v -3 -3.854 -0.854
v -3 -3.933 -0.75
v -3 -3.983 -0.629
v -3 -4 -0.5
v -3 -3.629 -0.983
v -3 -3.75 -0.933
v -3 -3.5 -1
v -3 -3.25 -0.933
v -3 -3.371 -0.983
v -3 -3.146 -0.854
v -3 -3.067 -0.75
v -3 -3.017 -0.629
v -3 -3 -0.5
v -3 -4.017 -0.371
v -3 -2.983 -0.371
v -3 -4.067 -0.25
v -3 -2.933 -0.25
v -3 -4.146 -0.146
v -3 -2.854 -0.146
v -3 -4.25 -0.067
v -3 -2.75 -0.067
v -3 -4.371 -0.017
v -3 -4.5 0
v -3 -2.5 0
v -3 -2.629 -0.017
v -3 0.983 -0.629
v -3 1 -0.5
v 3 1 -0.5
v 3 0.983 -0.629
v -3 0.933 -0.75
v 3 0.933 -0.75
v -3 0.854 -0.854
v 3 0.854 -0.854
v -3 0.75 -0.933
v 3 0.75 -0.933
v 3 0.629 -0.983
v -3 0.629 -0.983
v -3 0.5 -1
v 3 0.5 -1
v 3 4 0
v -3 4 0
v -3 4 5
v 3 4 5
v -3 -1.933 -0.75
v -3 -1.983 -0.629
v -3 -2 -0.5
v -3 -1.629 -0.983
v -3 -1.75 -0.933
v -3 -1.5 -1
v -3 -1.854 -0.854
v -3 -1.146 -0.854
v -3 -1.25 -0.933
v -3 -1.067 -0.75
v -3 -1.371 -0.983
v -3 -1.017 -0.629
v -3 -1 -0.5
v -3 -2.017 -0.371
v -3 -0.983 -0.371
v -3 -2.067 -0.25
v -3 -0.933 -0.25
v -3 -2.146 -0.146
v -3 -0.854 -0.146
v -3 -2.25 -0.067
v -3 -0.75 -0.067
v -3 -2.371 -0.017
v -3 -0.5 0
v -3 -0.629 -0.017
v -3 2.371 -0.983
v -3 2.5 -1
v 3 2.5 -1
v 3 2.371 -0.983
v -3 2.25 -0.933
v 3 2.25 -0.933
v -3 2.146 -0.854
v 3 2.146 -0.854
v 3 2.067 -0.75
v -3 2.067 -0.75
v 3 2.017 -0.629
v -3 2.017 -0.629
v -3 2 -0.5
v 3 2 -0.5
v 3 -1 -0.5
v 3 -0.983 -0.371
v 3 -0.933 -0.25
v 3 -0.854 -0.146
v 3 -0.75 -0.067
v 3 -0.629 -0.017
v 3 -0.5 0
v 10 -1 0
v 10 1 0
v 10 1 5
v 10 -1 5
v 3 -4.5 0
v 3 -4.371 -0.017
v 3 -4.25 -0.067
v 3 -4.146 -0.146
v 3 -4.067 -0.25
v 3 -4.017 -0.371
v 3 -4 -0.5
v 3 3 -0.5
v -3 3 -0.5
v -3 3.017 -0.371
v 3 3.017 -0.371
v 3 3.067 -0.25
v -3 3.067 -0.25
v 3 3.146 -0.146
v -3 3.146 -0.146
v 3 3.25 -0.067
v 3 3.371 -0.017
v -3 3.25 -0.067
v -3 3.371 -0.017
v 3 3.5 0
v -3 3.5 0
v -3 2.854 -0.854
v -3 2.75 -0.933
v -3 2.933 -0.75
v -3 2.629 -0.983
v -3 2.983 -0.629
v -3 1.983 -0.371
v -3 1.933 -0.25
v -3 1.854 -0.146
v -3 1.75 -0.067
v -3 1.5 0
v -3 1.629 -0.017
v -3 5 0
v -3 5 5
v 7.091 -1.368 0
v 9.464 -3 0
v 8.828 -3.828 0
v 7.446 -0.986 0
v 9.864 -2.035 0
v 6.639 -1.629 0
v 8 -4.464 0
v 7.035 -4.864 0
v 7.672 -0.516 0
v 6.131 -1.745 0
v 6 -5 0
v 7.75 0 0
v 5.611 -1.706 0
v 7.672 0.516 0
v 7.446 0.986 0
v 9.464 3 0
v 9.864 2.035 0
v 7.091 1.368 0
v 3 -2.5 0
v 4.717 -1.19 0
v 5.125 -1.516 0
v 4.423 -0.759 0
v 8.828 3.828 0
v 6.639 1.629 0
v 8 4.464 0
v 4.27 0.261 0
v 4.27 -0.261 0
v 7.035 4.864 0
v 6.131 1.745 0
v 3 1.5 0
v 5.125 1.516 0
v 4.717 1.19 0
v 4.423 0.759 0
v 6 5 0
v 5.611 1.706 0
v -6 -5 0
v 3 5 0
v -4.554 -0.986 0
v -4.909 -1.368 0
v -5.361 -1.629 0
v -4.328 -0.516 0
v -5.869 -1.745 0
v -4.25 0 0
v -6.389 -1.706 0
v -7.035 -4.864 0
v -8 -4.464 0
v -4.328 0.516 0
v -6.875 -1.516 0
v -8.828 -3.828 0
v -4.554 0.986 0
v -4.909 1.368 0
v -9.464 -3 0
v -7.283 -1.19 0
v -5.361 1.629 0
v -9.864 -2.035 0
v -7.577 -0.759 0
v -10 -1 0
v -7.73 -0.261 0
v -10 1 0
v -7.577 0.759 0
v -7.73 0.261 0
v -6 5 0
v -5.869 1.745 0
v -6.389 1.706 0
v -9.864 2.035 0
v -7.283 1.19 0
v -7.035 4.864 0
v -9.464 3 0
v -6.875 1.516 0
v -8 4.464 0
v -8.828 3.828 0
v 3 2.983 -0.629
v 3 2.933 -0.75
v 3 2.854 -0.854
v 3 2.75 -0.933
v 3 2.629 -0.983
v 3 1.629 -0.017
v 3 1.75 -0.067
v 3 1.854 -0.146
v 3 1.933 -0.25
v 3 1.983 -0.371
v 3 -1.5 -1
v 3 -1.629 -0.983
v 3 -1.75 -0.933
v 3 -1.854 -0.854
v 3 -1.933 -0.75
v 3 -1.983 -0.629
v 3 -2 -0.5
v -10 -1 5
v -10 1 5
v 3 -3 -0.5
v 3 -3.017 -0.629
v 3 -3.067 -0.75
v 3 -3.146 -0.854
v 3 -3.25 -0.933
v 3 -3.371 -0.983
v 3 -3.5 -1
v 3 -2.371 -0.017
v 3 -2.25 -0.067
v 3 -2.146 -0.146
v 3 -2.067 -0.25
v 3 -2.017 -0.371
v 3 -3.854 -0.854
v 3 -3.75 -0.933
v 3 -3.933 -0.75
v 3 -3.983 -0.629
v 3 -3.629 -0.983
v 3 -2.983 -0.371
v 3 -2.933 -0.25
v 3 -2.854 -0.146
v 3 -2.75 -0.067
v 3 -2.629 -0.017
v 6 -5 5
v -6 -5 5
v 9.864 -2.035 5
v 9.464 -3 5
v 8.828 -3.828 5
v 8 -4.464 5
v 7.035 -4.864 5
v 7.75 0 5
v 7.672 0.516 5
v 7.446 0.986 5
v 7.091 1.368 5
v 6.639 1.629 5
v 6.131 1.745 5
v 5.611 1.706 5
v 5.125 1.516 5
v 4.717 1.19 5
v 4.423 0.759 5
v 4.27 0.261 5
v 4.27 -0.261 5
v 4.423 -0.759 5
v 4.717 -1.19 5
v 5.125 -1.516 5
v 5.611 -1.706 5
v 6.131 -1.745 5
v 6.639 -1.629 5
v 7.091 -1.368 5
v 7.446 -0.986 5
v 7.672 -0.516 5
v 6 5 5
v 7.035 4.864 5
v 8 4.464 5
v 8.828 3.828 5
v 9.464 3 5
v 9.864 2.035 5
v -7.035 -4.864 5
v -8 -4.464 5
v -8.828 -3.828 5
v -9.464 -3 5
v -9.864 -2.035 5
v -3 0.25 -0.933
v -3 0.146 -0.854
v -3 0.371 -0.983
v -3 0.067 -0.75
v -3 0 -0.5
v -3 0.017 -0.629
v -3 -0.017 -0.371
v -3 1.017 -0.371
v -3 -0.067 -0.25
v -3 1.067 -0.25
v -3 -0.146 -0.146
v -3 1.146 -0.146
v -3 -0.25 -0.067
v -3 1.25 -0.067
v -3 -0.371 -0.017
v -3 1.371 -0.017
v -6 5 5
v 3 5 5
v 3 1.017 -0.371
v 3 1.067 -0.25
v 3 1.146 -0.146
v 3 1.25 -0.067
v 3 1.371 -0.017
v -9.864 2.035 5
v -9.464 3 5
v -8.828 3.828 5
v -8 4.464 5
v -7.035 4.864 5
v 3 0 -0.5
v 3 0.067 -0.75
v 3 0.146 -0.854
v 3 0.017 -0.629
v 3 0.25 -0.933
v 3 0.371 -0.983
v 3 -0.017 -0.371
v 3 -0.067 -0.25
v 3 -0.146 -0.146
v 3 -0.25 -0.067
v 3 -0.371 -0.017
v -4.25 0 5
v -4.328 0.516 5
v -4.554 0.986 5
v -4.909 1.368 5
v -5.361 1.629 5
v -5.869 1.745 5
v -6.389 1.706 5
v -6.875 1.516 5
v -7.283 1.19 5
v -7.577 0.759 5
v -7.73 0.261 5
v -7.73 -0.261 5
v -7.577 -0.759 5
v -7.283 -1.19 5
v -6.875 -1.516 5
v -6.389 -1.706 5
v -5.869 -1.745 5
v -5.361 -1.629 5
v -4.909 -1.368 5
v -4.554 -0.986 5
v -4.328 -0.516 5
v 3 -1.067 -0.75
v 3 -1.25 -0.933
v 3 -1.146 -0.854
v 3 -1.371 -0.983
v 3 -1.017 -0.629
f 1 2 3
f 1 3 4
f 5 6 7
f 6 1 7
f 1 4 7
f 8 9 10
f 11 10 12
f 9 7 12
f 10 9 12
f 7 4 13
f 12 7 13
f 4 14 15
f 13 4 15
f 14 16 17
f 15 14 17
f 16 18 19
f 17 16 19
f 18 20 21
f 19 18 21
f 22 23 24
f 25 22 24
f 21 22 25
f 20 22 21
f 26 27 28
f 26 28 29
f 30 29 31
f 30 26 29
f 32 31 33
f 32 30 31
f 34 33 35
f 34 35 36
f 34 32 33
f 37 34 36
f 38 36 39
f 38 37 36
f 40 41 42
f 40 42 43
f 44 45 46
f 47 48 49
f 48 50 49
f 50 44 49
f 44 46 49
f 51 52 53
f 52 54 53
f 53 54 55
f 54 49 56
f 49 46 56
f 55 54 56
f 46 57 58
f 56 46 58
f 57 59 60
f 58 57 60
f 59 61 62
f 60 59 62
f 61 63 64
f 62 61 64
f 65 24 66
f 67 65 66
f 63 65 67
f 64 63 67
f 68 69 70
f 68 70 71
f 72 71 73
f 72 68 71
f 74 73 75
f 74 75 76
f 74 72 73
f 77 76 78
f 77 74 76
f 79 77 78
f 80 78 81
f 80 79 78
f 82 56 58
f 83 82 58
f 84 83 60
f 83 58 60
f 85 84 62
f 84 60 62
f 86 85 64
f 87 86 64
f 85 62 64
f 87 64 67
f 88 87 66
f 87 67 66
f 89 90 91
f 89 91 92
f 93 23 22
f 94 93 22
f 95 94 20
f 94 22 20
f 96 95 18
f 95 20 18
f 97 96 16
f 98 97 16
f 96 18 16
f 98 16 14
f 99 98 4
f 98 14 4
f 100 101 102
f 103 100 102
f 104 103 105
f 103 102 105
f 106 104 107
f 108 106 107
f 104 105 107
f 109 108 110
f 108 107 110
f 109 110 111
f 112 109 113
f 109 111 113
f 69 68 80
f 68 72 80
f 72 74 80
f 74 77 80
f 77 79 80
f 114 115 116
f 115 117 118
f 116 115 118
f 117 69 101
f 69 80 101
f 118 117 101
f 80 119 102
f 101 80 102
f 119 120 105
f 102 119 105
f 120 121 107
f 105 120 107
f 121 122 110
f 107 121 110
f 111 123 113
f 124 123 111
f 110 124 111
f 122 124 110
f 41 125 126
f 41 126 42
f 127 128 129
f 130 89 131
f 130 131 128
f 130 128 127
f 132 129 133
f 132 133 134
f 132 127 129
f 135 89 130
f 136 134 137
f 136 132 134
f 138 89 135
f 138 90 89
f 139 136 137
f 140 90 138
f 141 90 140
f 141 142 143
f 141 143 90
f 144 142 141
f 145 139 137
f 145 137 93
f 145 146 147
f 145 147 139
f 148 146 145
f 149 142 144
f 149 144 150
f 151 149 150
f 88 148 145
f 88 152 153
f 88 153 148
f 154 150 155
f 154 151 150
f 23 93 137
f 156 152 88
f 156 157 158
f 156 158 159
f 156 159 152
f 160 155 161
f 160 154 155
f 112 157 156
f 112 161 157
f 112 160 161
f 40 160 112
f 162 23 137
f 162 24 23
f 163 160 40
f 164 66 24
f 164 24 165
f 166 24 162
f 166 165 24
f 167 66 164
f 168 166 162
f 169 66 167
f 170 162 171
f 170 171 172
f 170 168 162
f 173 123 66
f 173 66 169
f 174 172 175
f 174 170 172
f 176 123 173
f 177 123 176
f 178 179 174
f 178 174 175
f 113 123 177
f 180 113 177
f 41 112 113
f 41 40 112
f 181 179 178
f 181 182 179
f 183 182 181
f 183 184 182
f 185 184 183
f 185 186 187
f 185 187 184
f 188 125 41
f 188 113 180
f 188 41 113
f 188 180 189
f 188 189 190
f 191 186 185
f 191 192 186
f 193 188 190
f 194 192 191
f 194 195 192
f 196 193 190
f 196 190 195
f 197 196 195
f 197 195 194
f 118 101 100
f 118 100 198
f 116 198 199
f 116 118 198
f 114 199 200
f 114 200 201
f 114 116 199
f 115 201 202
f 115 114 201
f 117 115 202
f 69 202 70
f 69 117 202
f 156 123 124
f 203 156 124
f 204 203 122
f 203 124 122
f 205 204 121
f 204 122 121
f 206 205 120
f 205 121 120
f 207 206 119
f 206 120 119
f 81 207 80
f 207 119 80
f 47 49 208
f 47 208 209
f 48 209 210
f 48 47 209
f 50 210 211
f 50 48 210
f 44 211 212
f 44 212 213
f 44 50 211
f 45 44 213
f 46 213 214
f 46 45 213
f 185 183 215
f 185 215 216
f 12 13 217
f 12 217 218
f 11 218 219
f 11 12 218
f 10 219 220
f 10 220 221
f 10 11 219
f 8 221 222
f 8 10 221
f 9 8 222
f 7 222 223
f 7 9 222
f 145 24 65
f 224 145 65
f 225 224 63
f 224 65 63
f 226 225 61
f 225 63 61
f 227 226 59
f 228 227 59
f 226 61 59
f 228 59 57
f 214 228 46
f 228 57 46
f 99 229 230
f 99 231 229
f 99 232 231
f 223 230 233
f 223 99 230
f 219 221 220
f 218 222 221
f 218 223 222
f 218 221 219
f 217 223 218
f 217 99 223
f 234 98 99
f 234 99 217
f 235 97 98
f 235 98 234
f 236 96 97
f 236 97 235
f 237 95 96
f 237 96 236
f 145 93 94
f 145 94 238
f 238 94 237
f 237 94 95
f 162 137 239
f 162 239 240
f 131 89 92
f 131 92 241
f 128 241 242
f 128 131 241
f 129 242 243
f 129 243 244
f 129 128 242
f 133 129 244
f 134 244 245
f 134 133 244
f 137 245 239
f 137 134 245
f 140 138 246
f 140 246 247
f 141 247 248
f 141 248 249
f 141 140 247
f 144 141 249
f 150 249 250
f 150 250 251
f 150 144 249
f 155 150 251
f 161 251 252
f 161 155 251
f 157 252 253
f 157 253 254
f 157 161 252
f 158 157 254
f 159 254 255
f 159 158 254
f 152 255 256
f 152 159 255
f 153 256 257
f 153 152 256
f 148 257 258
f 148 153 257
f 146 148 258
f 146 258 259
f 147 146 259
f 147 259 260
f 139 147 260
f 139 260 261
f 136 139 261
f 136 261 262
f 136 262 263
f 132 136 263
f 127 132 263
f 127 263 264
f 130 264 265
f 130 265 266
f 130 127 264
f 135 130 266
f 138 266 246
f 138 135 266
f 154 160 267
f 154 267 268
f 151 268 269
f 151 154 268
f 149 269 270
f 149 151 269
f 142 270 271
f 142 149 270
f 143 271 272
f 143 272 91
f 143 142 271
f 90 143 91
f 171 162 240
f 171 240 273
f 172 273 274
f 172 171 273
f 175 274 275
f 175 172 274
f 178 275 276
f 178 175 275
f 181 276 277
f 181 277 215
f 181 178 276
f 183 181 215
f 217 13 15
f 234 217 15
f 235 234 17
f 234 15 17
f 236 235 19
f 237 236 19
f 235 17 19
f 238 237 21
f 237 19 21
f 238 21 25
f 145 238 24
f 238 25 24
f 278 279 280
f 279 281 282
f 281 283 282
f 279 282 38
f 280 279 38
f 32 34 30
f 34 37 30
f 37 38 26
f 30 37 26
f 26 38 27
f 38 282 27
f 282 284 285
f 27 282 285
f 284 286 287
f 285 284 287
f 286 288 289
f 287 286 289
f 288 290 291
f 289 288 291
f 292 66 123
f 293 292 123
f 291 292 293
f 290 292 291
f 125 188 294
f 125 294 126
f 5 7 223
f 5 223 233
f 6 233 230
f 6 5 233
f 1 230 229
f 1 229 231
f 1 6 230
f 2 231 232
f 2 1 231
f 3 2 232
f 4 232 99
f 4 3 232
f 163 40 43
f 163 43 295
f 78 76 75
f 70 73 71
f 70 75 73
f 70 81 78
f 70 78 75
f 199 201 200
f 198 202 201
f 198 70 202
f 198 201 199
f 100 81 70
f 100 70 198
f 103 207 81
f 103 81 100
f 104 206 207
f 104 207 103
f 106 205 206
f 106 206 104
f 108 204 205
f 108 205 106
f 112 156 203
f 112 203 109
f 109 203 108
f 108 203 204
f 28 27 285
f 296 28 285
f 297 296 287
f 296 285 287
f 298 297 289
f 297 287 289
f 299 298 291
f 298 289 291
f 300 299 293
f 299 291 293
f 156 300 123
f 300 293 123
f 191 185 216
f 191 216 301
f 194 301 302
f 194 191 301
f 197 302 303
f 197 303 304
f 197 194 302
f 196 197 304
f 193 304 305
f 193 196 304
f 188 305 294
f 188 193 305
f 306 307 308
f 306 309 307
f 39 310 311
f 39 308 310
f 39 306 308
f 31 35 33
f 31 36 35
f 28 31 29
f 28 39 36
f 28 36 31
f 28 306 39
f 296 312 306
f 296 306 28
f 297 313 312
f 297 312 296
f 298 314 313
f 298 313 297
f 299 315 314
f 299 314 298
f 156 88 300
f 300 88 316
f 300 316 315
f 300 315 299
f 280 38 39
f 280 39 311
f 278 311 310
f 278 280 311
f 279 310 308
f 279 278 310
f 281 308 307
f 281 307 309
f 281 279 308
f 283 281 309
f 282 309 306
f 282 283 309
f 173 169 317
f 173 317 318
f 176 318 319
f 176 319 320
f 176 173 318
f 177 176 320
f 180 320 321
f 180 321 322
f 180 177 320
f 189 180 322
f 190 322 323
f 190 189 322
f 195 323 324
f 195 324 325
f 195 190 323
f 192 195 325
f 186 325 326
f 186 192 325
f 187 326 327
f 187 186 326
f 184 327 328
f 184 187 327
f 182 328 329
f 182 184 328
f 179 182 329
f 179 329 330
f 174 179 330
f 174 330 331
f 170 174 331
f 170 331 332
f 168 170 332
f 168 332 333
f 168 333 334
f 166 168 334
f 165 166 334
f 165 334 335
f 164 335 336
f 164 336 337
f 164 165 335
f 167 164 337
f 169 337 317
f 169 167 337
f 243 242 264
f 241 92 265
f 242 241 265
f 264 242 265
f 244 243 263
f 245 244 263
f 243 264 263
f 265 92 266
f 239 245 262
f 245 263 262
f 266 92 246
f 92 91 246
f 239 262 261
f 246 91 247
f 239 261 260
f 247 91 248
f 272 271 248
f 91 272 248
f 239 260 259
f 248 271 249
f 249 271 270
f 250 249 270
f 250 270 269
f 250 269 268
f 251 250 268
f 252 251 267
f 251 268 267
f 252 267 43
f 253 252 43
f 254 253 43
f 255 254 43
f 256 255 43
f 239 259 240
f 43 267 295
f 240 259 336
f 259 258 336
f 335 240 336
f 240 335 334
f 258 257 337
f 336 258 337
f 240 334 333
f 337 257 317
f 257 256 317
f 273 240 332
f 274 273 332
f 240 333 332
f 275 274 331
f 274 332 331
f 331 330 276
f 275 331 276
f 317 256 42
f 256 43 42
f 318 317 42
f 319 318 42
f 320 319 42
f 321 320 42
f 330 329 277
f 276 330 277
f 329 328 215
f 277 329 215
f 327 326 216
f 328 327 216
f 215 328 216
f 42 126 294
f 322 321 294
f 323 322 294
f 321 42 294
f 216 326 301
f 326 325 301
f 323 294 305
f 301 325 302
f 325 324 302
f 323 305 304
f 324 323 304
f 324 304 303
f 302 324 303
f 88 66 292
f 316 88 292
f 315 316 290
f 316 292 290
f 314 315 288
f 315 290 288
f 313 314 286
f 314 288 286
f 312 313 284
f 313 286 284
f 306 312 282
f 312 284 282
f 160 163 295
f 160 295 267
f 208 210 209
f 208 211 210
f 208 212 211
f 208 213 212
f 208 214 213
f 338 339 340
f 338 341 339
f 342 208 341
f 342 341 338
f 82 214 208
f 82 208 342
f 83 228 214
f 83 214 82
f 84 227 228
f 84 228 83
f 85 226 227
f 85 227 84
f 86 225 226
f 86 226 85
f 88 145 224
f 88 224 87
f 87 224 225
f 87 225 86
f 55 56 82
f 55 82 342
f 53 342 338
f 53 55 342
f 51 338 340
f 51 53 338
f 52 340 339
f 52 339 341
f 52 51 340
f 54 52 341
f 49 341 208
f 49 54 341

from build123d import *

# Parameters (mm, degrees)
SKETCH1_R           = 1.75
BOSS_EXTRUDE1_DEPTH = 5
SKETCH2_W           = 6
SKETCH2_H           = 1
BOSS_EXTRUDE2_DEPTH = 1
FILLET1_START       = -3
FILLET1_DEPTH       = 6
FILLET1_2_DEPTH     = 6


with BuildPart() as part:
    # Sketch1 → Boss-Extrude1 (new body)
    with BuildSketch(Plane.XY):
        with BuildLine():
            Line((-6, 5), (-3, 5))
            Line((-3, 5), (-3, 4))
            Line((-3, 4), (3, 4))
            Line((3, 4), (3, 5))
            Line((3, 5), (6, 5))
            ThreePointArc((6, 5), (8.828427125, 3.828427125), (10, 1))
            Line((10, 1), (10, -1))
            ThreePointArc((10, -1), (8.828427125, -3.828427125), (6, -5))
            Line((6, -5), (-6, -5))
            ThreePointArc((-6, -5), (-8.828427125, -3.828427125), (-10, -1))
            Line((-10, -1), (-10, 1))
            ThreePointArc((-10, 1), (-8.828427125, 3.828427125), (-6, 5))
        make_face()
        with Locations((6, 0)):
            Circle(SKETCH1_R, mode=Mode.SUBTRACT)
        with Locations((-6, 0)):
            Circle(SKETCH1_R, mode=Mode.SUBTRACT)
    extrude(amount=BOSS_EXTRUDE1_DEPTH)

    # Sketch2 → Boss-Extrude2 (add)
    with BuildSketch(Plane(origin=(0, 0, 0), x_dir=(-1, 0, 0), z_dir=(0, 0, -1))):
        with Locations((0, 2.5)):
            Rectangle(SKETCH2_W, SKETCH2_H)
        with Locations((0, 0.5)):
            Rectangle(SKETCH2_W, SKETCH2_H)
        with Locations((0, -1.5)):
            Rectangle(SKETCH2_W, SKETCH2_H)
        with Locations((0, -3.5)):
            Rectangle(SKETCH2_W, SKETCH2_H)
    extrude(amount=BOSS_EXTRUDE2_DEPTH)

    # Fillet1: read off the stored shape, not the designer's step
    # Fillet1 outline → Fillet1 (cut)
    with BuildSketch(Plane.YZ.offset(FILLET1_START)):
        with BuildLine():
            ThreePointArc((-3.5, -1), (-3.853553391, -0.853553391), (-4, -0.5))
            Line((-4, -0.5), (-4, -1))
            Line((-4, -1), (-3.5, -1))
        make_face()
        with BuildLine():
            ThreePointArc((-3, -0.5), (-3.146446609, -0.853553391), (-3.5, -1))
            Line((-3.5, -1), (-3, -1))
            Line((-3, -1), (-3, -0.5))
        make_face()
        with BuildLine():
            ThreePointArc((-1.5, -1), (-1.853553391, -0.853553391), (-2, -0.5))
            Line((-2, -0.5), (-2, -1))
            Line((-2, -1), (-1.5, -1))
        make_face()
        with BuildLine():
            ThreePointArc((-1, -0.5), (-1.146446609, -0.853553391), (-1.5, -1))
            Line((-1.5, -1), (-1, -1))
            Line((-1, -1), (-1, -0.5))
        make_face()
        with BuildLine():
            ThreePointArc((0.5, -1), (0.146446609, -0.853553391), (0, -0.5))
            Line((0, -0.5), (0, -1))
            Line((0, -1), (0.5, -1))
        make_face()
        with BuildLine():
            ThreePointArc((1, -0.5), (0.853553391, -0.853553391), (0.5, -1))
            Line((0.5, -1), (1, -1))
            Line((1, -1), (1, -0.5))
        make_face()
        with BuildLine():
            ThreePointArc((2.5, -1), (2.146446609, -0.853553391), (2, -0.5))
            Line((2, -0.5), (2, -1))
            Line((2, -1), (2.5, -1))
        make_face()
        with BuildLine():
            ThreePointArc((3, -0.5), (2.853553391, -0.853553391), (2.5, -1))
            Line((2.5, -1), (3, -1))
            Line((3, -1), (3, -0.5))
        make_face()
    extrude(amount=FILLET1_DEPTH, mode=Mode.SUBTRACT)

    # Fillet1 2 outline → Fillet1 2 (add)
    with BuildSketch(Plane.YZ.offset(FILLET1_START)):
        with BuildLine():
            Line((-4, 0), (-4.5, 0))
            ThreePointArc((-4.5, 0), (-4.146446609, -0.146446609), (-4, -0.5))
            Line((-4, -0.5), (-4, 0))
        make_face()
        with BuildLine():
            Line((2, 0), (1.5, 0))
            ThreePointArc((1.5, 0), (1.853553391, -0.146446609), (2, -0.5))
            Line((2, -0.5), (2, 0))
        make_face()
        with BuildLine():
            Line((0, 0), (-0.5, 0))
            ThreePointArc((-0.5, 0), (-0.146446609, -0.146446609), (0, -0.5))
            Line((0, -0.5), (0, 0))
        make_face()
        with BuildLine():
            Line((-2, 0), (-2.5, 0))
            ThreePointArc((-2.5, 0), (-2.146446609, -0.146446609), (-2, -0.5))
            Line((-2, -0.5), (-2, 0))
        make_face()
        with BuildLine():
            Line((-2.5, 0), (-3, 0))
            Line((-3, 0), (-3, -0.5))
            ThreePointArc((-3, -0.5), (-2.853553391, -0.146446609), (-2.5, 0))
        make_face()
        with BuildLine():
            Line((-0.5, 0), (-1, 0))
            Line((-1, 0), (-1, -0.5))
            ThreePointArc((-1, -0.5), (-0.853553391, -0.146446609), (-0.5, 0))
        make_face()
        with BuildLine():
            Line((1.5, 0), (1, 0))
            Line((1, 0), (1, -0.5))
            ThreePointArc((1, -0.5), (1.146446609, -0.146446609), (1.5, 0))
        make_face()
        with BuildLine():
            Line((3.5, 0), (3, 0))
            Line((3, 0), (3, -0.5))
            ThreePointArc((3, -0.5), (3.146446609, -0.146446609), (3.5, 0))
        make_face()
    extrude(amount=FILLET1_2_DEPTH)


solid = part.part
